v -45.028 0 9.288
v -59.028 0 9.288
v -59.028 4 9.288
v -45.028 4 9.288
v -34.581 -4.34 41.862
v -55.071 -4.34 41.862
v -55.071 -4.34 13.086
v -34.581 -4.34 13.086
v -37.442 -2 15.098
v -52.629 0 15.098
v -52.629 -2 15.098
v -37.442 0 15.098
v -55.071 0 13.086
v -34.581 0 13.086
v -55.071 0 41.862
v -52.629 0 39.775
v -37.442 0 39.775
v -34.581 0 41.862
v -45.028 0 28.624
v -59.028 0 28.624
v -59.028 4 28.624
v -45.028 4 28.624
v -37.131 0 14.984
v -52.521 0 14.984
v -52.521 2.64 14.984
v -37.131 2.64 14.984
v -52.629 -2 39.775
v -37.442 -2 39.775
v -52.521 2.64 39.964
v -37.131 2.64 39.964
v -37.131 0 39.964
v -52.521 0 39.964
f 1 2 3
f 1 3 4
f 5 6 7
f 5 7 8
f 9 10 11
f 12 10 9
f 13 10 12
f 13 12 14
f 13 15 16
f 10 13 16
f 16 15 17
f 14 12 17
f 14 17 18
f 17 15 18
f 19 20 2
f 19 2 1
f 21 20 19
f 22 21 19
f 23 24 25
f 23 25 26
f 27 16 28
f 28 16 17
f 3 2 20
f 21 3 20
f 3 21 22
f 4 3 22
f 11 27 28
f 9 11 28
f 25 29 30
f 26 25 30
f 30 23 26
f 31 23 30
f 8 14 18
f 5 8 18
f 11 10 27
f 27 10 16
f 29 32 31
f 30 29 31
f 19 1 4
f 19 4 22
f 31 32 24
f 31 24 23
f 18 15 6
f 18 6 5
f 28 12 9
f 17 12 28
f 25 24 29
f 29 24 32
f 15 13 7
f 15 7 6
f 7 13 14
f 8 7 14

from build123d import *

# Parameters (mm, degrees)
F0_W     = 15.39
F0_H     = 24.98
F1_DEPTH = 2.64
F2_W     = 20.49
F2_H     = 28.776
F3_DEPTH = 4.34
F4_W     = 15.186399
F4_H     = 24.676934
F5_DEPTH = 2
F6_W     = 14
F6_H     = 19.3363
F7_DEPTH = 4


with BuildPart() as f1:
    # F0 (on Front) → F1 (new body)
    with BuildSketch(Plane.XZ):
        with Locations((-44.825791, 27.474496)):
            Rectangle(F0_W, F0_H)
    extrude(amount=-F1_DEPTH)


with BuildPart() as f3:
    # F2 (on Front) → F3 (new body)
    with BuildSketch(Plane.XZ):
        with Locations((-44.825791, 27.474496)):
            Rectangle(F2_W, F2_H)
    extrude(amount=F3_DEPTH)

    # F4 (on Front) → F5 (cut)
    with BuildSketch(Plane.XZ):
        with Locations((-45.035507, 27.436122)):
            Rectangle(F4_W, F4_H)
    extrude(amount=F5_DEPTH, mode=Mode.SUBTRACT)


with BuildPart() as f7:
    # F6 (on Front) → F7 (new body)
    with BuildSketch(Plane.XZ):
        with Locations((-52.027962, 18.956081)):
            Rectangle(F6_W, F6_H)
    extrude(amount=-F7_DEPTH)


solid = Compound([f1.part, f3.part, f7.part])
